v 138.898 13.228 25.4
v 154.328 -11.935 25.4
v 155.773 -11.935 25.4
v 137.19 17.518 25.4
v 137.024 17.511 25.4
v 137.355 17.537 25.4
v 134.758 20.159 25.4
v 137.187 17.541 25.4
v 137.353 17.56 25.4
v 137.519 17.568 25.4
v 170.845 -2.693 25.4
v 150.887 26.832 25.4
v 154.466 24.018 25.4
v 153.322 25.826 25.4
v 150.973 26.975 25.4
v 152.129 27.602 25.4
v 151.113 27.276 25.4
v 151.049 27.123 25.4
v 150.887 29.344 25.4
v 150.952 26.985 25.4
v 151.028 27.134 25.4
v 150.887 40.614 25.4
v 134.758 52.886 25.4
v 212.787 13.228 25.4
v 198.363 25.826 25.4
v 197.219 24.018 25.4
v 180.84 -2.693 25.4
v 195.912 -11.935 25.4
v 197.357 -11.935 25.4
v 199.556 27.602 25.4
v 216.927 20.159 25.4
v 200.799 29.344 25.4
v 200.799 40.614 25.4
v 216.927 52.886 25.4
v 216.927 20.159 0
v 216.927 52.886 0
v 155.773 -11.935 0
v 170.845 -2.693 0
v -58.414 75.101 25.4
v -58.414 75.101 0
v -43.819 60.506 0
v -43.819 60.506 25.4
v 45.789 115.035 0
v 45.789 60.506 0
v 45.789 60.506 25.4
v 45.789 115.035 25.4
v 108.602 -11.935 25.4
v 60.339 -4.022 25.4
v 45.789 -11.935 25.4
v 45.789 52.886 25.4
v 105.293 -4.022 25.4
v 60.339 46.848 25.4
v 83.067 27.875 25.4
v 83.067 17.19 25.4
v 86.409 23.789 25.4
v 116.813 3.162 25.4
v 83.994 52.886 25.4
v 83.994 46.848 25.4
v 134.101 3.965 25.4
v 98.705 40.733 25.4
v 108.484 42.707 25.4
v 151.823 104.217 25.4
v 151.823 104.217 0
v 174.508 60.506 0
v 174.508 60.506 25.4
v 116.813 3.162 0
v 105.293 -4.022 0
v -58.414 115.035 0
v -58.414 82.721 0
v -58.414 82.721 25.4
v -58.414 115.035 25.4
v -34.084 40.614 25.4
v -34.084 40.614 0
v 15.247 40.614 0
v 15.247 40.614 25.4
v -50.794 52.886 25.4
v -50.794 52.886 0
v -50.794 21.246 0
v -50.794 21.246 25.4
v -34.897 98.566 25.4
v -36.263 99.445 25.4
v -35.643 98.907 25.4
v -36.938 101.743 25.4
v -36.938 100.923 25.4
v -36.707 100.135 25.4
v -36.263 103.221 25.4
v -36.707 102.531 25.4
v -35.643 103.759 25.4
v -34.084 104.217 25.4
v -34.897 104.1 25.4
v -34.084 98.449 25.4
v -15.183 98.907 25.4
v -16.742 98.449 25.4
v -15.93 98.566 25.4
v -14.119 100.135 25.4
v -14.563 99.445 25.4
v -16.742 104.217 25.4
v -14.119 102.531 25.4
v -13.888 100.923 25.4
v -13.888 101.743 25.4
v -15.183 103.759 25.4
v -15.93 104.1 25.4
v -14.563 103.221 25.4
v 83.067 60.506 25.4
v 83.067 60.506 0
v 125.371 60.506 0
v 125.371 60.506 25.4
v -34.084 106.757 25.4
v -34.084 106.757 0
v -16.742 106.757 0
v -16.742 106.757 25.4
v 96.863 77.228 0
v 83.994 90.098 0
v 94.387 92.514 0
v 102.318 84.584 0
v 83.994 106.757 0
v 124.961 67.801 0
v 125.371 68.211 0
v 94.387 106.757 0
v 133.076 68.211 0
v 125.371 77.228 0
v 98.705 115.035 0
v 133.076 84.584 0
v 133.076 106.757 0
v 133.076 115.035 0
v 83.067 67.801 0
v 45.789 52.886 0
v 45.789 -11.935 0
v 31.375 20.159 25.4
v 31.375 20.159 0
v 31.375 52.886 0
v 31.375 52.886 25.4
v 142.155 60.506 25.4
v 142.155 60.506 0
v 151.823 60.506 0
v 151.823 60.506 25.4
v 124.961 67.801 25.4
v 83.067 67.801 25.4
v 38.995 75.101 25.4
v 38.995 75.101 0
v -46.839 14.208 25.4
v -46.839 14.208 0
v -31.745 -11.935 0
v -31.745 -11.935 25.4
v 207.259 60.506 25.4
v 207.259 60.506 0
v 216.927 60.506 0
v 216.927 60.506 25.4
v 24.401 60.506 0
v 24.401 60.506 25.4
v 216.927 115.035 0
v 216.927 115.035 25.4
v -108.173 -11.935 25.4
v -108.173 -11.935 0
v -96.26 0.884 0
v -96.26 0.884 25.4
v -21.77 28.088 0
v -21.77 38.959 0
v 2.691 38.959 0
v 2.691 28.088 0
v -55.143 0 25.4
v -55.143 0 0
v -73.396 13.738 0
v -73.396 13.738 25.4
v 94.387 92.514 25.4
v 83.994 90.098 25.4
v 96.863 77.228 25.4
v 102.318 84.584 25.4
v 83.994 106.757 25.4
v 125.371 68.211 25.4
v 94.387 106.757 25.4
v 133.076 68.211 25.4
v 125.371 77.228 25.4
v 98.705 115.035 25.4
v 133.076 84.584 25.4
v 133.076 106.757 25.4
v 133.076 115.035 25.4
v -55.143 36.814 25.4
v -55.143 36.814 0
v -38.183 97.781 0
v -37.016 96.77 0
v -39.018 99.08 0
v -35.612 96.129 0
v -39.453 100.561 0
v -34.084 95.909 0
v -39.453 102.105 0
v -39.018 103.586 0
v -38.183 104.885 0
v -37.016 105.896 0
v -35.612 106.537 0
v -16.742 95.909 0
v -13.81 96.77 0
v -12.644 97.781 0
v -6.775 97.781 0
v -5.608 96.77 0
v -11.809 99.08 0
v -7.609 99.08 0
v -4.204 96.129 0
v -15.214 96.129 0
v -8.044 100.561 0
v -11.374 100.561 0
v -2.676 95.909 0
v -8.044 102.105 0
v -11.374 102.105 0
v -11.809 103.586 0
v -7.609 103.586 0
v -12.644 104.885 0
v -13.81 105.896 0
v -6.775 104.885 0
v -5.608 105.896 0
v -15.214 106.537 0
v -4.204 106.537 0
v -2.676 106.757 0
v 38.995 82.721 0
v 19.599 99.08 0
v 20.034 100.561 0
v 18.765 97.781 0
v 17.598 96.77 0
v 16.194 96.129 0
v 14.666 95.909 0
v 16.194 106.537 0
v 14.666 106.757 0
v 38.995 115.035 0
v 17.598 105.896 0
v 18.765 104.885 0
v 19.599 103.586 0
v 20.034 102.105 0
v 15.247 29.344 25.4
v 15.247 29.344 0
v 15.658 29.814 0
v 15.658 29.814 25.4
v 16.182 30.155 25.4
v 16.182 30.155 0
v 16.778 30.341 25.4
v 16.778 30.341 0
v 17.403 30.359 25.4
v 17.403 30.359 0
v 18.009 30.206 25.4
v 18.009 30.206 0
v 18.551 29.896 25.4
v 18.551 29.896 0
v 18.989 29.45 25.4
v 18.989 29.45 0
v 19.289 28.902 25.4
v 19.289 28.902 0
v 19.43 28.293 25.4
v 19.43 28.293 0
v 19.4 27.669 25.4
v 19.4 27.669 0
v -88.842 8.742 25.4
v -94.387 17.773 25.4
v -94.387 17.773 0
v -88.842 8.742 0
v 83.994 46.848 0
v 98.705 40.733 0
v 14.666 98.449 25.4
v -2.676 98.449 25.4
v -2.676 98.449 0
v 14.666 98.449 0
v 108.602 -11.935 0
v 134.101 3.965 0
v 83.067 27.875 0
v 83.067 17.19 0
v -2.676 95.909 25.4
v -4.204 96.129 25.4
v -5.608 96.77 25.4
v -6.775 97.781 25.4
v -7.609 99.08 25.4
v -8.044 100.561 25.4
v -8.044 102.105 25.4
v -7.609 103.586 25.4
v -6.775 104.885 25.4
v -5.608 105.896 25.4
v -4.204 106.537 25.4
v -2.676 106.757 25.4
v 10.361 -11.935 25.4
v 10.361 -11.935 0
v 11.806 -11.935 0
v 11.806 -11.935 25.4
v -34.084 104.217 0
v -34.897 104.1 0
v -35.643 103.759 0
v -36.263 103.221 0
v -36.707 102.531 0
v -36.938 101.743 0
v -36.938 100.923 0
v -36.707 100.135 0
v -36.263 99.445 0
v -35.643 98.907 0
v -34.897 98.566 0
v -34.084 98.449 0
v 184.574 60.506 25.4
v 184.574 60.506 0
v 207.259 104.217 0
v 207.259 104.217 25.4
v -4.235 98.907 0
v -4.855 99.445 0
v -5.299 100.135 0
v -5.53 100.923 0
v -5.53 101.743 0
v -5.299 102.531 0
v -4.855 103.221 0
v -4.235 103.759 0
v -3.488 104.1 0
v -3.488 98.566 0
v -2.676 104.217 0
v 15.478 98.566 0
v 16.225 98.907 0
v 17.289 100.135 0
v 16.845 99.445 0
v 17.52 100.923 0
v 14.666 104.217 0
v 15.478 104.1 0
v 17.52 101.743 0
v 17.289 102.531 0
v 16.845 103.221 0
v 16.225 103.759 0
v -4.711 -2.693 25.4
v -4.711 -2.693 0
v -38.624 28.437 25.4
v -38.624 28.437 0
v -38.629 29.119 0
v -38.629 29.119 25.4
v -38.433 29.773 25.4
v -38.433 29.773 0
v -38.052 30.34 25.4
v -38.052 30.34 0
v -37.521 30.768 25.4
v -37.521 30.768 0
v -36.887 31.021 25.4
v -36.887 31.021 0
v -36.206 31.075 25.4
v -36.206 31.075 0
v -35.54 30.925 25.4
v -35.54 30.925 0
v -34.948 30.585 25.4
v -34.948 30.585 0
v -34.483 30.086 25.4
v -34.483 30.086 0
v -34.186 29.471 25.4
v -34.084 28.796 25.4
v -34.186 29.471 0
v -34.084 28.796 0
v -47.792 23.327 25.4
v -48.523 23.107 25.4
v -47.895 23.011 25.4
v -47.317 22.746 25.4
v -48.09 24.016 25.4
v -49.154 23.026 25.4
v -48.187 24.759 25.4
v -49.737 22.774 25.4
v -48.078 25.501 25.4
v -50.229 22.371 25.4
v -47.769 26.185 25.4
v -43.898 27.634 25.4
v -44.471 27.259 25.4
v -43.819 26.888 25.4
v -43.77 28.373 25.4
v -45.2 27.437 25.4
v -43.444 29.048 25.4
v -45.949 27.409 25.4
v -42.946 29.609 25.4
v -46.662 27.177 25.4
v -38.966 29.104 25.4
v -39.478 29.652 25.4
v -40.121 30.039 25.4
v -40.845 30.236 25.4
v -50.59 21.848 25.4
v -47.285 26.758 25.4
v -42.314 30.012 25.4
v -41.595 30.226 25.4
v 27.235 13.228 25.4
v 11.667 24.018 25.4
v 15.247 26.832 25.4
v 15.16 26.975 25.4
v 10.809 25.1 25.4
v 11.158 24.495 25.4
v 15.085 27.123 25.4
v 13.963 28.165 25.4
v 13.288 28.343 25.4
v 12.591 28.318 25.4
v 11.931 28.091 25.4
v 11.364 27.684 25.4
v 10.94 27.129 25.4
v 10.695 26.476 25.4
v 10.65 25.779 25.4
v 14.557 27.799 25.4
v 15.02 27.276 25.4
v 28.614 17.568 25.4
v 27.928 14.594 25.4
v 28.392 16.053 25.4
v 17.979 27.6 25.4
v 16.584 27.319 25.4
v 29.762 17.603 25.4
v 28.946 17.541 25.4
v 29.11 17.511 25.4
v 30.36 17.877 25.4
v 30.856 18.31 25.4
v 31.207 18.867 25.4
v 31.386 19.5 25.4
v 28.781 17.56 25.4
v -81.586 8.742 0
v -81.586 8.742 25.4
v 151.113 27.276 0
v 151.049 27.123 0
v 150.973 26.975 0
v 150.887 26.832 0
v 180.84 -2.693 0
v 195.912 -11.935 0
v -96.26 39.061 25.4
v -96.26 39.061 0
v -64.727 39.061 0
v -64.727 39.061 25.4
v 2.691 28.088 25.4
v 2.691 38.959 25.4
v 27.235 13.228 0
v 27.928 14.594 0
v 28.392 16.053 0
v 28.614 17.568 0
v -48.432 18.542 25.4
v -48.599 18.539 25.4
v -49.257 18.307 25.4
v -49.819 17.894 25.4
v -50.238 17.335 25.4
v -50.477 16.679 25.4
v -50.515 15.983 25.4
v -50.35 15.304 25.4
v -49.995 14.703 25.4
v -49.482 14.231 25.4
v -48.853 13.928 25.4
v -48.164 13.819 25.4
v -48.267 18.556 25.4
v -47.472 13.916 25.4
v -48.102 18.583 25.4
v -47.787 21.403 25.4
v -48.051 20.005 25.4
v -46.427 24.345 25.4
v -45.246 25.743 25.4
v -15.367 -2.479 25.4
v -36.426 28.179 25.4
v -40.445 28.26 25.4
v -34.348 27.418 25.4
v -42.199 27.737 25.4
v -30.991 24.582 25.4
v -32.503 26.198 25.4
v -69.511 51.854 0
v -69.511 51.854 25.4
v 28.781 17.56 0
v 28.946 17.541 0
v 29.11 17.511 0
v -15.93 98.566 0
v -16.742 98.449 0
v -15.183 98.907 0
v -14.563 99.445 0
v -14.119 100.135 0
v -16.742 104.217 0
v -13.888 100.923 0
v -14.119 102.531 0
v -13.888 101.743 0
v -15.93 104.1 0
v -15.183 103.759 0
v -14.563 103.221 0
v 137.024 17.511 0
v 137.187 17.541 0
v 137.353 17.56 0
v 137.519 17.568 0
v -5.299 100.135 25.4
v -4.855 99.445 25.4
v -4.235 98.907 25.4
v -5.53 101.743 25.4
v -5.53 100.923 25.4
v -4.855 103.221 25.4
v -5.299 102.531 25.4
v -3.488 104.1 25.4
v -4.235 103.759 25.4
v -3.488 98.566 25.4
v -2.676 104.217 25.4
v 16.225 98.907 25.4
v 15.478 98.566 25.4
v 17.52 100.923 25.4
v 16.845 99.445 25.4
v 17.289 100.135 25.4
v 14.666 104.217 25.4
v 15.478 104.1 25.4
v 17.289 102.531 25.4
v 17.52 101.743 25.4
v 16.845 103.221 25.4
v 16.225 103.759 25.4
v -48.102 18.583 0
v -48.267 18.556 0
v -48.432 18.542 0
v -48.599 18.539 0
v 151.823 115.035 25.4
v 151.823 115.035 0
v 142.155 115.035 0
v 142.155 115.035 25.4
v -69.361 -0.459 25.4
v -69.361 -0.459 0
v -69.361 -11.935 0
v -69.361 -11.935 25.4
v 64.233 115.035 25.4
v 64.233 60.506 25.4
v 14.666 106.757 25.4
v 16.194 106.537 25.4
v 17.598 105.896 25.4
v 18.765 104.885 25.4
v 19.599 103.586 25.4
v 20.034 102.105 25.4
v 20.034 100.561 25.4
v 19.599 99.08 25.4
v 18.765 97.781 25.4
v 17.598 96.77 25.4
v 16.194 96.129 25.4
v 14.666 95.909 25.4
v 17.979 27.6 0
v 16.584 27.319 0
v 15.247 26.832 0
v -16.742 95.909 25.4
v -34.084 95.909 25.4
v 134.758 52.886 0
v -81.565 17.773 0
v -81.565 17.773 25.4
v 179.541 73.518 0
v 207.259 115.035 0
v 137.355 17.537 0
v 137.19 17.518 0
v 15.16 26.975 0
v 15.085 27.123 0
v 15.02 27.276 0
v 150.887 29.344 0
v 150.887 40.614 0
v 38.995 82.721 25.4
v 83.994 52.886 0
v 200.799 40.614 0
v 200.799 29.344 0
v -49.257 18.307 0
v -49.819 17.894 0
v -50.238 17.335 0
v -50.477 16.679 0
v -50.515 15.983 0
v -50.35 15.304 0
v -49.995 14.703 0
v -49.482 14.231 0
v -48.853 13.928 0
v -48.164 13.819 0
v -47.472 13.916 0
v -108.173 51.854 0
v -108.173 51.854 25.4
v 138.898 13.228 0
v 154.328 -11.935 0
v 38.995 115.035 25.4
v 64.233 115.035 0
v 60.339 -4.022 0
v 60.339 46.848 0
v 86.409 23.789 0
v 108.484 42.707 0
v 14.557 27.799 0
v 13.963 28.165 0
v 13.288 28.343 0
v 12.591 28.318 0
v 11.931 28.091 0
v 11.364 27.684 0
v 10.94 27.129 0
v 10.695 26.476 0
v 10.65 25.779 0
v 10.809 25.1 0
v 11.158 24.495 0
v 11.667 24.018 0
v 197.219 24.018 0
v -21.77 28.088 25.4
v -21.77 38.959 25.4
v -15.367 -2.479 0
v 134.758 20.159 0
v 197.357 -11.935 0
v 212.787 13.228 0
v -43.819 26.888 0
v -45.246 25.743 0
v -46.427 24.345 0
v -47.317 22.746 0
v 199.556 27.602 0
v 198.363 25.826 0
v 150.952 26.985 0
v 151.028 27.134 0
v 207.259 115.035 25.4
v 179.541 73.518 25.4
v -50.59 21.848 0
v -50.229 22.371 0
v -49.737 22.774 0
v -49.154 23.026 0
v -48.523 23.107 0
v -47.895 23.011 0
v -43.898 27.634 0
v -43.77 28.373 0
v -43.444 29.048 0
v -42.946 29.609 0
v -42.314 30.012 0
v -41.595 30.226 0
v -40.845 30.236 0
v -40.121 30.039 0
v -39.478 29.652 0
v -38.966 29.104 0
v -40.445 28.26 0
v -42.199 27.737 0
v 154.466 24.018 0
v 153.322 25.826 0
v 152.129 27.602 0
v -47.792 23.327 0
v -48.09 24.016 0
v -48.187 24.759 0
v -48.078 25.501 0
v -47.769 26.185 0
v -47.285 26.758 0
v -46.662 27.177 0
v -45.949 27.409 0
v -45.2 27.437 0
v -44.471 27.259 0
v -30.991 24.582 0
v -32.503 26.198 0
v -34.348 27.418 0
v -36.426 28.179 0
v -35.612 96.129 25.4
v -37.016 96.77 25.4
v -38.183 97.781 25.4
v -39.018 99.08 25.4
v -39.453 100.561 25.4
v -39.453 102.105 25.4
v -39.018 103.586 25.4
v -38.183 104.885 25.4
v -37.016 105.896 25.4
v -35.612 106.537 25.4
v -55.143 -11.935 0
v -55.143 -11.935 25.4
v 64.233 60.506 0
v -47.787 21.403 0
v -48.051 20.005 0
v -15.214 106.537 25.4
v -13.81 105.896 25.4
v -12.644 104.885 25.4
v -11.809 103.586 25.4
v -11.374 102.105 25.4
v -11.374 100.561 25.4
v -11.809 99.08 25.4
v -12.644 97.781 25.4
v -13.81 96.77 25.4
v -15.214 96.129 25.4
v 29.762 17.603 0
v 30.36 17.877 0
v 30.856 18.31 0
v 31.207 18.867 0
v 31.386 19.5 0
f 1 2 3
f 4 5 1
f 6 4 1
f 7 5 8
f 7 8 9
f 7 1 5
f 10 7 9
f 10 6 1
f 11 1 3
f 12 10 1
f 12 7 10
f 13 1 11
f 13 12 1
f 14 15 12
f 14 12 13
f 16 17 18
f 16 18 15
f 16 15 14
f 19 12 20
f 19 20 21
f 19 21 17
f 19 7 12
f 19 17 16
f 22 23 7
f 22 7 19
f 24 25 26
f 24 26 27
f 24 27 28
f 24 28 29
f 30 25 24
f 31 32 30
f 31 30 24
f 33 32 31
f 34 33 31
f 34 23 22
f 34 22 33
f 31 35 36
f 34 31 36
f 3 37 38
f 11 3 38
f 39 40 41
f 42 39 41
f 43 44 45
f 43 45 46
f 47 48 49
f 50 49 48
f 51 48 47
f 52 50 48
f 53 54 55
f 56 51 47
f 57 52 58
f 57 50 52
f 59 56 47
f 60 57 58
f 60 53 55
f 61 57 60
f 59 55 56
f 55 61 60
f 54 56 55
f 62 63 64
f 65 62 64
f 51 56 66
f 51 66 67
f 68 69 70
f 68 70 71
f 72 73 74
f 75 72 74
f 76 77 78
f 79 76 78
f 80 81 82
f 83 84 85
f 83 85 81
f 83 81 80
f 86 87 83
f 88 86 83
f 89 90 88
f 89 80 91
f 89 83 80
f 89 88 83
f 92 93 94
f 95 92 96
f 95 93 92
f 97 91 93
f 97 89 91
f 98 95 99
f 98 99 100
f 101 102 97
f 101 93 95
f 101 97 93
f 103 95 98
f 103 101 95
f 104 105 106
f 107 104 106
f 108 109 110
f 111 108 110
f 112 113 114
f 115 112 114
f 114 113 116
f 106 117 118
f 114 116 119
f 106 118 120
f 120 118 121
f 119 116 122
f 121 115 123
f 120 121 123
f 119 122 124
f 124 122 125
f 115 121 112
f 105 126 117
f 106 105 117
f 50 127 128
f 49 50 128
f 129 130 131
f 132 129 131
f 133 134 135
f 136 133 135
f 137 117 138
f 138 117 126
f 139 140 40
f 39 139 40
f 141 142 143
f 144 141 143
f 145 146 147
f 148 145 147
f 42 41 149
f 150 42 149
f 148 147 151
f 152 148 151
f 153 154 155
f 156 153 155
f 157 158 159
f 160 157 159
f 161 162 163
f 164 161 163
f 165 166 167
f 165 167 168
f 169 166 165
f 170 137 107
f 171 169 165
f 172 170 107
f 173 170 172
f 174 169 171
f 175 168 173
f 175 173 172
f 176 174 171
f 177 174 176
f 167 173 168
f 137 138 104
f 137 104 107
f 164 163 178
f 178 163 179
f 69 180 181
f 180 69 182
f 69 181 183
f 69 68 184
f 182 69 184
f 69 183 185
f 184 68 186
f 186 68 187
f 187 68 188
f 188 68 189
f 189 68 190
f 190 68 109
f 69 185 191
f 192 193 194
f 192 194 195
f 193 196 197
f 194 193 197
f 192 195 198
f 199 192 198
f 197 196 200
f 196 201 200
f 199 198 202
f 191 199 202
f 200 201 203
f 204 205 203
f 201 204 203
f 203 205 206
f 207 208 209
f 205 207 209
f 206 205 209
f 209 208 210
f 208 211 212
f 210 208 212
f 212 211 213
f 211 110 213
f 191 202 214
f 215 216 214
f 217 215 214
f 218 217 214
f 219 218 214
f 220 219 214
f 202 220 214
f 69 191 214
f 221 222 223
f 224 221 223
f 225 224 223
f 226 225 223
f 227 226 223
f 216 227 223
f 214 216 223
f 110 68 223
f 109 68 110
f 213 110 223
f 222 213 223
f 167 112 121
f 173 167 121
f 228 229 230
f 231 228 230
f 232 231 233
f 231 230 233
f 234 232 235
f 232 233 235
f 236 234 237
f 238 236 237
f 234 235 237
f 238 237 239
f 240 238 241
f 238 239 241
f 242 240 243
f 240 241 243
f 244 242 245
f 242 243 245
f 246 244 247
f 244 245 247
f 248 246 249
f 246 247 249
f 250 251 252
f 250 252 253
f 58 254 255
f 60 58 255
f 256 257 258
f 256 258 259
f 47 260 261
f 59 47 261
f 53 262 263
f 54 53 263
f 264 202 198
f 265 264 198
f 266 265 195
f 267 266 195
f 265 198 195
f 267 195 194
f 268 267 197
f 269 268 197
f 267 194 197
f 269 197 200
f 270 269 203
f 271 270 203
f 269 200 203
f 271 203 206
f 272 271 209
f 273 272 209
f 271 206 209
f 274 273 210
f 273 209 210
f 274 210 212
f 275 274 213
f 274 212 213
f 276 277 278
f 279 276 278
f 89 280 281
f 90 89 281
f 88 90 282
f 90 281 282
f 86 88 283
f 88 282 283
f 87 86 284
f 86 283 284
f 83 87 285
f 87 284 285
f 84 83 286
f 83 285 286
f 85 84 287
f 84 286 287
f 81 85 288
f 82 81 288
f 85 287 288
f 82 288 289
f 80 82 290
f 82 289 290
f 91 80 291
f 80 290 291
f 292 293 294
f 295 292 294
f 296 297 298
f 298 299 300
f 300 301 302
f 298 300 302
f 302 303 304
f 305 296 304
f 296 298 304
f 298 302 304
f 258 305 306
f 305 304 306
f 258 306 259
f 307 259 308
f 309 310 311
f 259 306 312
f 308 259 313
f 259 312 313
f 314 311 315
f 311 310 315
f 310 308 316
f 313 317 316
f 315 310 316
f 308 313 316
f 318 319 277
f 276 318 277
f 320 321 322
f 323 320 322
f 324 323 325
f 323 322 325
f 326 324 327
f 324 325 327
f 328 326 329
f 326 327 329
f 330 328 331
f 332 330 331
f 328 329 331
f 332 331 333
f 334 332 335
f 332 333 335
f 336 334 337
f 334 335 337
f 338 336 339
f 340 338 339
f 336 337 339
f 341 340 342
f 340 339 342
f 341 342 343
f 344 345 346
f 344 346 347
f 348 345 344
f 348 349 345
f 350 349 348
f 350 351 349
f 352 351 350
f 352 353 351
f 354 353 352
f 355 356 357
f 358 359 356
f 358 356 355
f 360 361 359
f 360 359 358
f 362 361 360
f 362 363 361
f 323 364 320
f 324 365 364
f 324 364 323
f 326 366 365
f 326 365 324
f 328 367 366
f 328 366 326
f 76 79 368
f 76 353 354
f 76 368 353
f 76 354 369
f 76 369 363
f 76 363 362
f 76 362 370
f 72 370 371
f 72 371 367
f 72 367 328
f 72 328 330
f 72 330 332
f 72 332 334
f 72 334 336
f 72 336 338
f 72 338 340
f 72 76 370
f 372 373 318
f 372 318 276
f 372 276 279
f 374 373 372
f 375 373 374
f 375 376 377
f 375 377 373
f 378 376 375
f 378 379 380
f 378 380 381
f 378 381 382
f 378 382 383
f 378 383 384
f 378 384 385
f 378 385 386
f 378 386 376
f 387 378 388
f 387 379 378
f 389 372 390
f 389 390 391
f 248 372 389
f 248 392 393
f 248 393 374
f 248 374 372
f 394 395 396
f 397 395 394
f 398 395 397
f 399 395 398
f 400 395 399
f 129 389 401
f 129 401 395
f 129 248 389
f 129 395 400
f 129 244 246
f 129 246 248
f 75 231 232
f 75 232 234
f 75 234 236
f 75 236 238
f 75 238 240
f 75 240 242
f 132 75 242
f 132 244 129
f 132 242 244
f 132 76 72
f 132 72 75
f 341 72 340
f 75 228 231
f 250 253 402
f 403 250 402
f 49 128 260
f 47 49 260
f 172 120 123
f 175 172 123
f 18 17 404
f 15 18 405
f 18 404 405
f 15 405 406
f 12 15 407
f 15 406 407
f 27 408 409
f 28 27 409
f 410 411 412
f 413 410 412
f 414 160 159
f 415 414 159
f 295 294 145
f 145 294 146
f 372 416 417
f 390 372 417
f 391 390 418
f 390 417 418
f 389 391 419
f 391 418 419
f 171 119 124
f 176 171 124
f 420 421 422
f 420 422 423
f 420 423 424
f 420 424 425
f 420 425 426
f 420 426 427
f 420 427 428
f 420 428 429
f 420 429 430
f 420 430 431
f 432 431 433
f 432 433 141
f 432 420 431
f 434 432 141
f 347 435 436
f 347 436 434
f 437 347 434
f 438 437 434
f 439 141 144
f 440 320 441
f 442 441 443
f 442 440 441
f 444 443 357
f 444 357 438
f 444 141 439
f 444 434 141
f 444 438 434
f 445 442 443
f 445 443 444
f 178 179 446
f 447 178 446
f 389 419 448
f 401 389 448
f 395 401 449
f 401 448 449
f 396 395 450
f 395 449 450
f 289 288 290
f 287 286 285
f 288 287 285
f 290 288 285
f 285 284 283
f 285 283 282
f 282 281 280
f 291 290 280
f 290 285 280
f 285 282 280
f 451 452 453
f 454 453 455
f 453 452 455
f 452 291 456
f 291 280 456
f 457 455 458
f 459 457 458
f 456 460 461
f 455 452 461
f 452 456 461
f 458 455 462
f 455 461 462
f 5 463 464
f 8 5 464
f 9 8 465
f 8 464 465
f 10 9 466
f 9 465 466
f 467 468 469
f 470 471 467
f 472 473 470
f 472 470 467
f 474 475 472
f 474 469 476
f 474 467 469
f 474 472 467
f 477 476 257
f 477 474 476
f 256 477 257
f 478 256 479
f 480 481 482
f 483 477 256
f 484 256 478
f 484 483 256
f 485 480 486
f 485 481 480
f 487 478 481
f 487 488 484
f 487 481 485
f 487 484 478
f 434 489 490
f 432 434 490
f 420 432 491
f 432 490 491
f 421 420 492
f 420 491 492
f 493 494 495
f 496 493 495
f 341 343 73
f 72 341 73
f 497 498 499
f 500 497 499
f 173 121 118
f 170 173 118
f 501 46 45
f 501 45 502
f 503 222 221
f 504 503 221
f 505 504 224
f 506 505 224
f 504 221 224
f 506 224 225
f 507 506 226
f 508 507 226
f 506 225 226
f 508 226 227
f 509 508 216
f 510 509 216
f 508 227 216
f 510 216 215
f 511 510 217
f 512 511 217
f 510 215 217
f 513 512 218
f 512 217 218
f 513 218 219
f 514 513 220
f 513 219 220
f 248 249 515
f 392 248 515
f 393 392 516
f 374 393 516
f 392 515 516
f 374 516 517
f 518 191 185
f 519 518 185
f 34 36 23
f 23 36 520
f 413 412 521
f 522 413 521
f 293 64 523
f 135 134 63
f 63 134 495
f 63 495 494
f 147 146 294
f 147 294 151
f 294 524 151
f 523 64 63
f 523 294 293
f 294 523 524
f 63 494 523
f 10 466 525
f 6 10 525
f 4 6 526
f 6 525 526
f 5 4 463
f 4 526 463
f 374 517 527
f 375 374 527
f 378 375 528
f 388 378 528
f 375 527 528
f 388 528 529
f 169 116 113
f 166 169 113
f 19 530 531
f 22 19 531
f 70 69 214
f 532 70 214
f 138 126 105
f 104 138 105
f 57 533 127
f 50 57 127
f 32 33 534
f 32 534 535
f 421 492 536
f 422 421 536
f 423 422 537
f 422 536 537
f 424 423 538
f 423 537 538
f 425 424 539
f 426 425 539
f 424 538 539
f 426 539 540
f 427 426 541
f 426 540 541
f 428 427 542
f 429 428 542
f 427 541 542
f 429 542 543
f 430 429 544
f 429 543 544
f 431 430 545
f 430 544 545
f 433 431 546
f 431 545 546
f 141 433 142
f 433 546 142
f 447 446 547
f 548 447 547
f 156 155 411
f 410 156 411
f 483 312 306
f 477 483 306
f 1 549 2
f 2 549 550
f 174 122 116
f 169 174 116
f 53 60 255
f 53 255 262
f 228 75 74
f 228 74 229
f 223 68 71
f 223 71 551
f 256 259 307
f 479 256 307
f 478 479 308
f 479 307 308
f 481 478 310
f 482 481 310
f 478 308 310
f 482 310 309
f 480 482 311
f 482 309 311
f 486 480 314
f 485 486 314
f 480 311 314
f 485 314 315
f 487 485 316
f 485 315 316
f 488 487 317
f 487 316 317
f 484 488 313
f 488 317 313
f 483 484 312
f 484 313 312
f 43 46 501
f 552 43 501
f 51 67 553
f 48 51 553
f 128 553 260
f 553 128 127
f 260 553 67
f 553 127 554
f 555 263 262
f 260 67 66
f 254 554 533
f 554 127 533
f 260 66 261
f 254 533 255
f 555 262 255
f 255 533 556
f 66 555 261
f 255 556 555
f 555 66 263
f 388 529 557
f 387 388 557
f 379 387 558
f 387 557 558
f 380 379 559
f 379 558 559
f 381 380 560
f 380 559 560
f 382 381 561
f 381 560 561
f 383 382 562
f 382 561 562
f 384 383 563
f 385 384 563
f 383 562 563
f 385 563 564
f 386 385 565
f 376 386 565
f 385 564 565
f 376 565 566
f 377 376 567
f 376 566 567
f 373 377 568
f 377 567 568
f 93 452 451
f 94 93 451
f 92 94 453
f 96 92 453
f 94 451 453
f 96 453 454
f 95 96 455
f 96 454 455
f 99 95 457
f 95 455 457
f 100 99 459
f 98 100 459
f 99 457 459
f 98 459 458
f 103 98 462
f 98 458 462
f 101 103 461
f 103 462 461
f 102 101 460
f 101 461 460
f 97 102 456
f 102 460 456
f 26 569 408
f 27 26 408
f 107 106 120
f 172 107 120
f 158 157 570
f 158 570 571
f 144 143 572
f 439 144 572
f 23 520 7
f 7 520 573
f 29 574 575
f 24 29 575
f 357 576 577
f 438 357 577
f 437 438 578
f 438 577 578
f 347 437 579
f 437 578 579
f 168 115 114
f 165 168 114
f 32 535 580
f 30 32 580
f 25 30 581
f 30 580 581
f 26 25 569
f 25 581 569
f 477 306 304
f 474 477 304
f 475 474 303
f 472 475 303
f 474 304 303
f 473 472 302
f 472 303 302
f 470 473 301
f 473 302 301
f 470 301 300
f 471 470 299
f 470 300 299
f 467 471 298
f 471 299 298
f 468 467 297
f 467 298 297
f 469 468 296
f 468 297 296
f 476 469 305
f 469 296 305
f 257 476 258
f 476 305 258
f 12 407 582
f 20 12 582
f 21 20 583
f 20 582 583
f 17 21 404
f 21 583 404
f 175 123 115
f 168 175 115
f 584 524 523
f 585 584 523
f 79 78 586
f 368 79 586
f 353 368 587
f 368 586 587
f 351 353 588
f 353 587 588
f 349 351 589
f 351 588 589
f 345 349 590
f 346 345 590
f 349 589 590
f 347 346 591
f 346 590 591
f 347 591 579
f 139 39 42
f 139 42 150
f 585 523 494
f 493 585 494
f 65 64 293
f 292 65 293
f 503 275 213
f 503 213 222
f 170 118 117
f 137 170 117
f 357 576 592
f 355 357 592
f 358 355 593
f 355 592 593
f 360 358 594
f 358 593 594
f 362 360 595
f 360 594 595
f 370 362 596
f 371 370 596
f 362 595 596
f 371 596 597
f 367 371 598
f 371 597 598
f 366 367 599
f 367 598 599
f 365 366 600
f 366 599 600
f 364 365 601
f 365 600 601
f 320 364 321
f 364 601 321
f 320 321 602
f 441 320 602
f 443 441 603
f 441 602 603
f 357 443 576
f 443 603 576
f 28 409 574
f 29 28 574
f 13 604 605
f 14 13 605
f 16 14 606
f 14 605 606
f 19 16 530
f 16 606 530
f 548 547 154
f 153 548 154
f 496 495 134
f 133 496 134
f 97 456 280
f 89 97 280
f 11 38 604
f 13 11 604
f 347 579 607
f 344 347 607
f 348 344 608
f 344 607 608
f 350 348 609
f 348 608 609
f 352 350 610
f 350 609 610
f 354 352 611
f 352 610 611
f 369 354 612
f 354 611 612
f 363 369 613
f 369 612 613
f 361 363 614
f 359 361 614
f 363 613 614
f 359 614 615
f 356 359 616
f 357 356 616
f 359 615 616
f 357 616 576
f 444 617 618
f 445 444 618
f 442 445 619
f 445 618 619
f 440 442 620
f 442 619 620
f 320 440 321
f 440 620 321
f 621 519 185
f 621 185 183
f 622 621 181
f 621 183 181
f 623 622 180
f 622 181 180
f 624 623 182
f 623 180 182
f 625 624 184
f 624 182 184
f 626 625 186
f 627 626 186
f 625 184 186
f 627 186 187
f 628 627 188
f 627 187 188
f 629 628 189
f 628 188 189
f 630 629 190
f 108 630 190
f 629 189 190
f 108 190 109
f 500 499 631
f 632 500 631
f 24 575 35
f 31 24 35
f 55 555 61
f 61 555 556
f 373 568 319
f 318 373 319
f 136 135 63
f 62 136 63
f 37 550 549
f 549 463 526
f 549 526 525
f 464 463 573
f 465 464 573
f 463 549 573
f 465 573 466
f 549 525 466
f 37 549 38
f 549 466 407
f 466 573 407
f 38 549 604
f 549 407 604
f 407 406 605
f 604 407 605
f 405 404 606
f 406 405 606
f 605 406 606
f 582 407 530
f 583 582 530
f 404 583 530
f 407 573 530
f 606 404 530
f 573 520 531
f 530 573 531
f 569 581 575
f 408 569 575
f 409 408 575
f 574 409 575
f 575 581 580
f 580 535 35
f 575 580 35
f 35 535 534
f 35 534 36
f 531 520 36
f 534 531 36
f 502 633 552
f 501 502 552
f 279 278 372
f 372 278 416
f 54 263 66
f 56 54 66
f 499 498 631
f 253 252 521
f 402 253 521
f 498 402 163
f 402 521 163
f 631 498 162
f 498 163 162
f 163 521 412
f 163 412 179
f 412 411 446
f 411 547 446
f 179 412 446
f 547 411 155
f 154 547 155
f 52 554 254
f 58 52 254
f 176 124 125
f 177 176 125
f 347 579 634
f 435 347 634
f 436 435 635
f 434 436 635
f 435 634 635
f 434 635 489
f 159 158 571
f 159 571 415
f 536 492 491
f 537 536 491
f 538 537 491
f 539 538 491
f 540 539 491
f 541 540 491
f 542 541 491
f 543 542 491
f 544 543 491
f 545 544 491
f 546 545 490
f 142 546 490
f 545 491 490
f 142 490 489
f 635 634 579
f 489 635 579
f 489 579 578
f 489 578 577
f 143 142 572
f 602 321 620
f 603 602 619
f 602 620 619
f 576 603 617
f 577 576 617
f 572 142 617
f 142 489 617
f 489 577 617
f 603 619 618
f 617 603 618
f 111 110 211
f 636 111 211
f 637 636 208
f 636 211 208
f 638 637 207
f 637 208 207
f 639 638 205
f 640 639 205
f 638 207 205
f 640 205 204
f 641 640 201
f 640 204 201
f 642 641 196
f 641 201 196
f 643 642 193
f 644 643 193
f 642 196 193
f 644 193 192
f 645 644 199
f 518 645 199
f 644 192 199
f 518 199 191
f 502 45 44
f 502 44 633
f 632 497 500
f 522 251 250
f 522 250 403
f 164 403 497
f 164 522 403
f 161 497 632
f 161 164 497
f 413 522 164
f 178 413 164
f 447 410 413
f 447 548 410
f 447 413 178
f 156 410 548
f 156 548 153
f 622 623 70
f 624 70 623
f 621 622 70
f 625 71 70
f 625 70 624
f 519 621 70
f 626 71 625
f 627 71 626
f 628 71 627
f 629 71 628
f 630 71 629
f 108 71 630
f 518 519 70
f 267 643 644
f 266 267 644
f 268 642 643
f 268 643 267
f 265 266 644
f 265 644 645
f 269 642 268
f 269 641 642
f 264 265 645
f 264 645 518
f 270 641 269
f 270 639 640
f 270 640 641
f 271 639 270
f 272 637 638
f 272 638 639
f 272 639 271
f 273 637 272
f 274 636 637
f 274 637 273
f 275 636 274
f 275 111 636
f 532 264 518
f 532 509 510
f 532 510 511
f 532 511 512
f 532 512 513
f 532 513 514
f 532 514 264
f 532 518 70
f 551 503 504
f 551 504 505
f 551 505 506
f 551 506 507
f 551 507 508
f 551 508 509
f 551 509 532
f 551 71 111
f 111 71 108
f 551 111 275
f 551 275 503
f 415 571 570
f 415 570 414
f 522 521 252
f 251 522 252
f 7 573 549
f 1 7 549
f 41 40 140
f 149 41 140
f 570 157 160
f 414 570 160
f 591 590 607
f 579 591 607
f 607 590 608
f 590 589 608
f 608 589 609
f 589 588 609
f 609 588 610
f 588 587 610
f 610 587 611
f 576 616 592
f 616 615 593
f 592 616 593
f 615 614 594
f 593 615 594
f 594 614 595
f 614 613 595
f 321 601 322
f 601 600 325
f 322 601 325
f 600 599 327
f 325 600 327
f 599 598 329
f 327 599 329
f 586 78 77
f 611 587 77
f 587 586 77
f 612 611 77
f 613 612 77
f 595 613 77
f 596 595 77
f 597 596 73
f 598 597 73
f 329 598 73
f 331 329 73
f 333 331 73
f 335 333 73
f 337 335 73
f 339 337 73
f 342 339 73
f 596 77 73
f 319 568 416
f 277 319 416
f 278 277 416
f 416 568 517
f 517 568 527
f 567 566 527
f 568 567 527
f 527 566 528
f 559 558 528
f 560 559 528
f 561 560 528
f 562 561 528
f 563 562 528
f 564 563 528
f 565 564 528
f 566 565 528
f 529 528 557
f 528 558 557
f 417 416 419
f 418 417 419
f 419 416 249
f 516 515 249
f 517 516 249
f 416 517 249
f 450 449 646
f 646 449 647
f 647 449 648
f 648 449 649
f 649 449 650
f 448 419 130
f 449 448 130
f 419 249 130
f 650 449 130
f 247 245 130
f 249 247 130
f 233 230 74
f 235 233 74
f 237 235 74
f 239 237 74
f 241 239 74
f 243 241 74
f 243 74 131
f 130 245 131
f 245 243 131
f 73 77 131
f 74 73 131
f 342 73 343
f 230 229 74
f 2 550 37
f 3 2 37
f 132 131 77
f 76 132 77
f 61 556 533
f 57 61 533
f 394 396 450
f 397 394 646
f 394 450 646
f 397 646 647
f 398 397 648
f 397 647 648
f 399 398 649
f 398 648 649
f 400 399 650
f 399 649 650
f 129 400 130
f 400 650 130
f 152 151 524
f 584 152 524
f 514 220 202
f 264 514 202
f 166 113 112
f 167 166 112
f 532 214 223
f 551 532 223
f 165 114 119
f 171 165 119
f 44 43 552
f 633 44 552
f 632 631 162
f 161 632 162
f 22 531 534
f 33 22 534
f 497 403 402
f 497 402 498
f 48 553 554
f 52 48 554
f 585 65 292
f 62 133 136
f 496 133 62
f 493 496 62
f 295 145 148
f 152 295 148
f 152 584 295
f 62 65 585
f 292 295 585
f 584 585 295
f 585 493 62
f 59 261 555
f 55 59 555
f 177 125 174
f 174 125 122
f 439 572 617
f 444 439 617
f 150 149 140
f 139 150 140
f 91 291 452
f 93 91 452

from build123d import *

# Parameters (mm, degrees)
BOSS_EXTRUDE2_DEPTH    = 25.4
BOSS_EXTRUDE2_2_DEPTH  = 25.4
BOSS_EXTRUDE2_3_DEPTH  = 25.4
SKETCH1_W              = 24.461502648
SKETCH1_H              = 10.87055051
BOSS_EXTRUDE2_4_DEPTH  = 25.4
BOSS_EXTRUDE2_5_DEPTH  = 25.4
BOSS_EXTRUDE2_6_DEPTH  = 25.4
BOSS_EXTRUDE2_7_DEPTH  = 25.4
SKETCH1_W_2            = 97.40937404
SKETCH1_H_2            = 32.313406886
BOSS_EXTRUDE2_8_DEPTH  = 25.4
BOSS_EXTRUDE2_9_DEPTH  = 25.4
BOSS_EXTRUDE2_10_DEPTH = 25.4
SKETCH1_W_3            = 18.443976291
SKETCH1_H_3            = 54.528233079
BOSS_EXTRUDE2_11_DEPTH = 25.4
BOSS_EXTRUDE2_12_DEPTH = 25.4
BOSS_EXTRUDE2_13_DEPTH = 25.4


with BuildPart() as part:
    # Sketch1 → Boss-Extrude2 (new body)
    with BuildSketch(Plane.XY):
        Polygon((-108.172530118, -11.93518958), (-96.26010229, 0.884070844), (-96.26010229, 39.060533562), (-64.726825967, 39.060533562), (-81.565077277, 17.772573776), (-94.386884579, 17.772573776), (-88.841643973, 8.742184939), (-81.585901967, 8.742184939), (-69.36107171, -0.45860836), (-69.36107171, -11.93518958), (-55.143012689, -11.93518958), (-55.143012689, 0), (-73.395926297, 13.737719189), (-55.143012689, 36.814182636), (-69.510757828, 51.854310106), (-108.172530118, 51.854310106), align=None)
    extrude(amount=BOSS_EXTRUDE2_DEPTH)


with BuildPart() as body_2:
    # Sketch1 → Boss-Extrude2 2 (new body)
    with BuildSketch(Plane.XY):
        with BuildLine():
            Line((-46.838728316, 14.208343836), (-31.744752261, -11.93518958))
            Line((-31.744752261, -11.93518958), (-15.366651823, -2.479288883))
            Line((-15.366651823, -2.479288883), (-30.990670753, 24.582305721))
            ThreePointArc((-30.990670753, 24.582305721), (-34.348326386, 27.418492639), (-38.623947508, 28.436761569))
            ThreePointArc((-38.623947508, 28.436761569), (-41.334535763, 28.041229116), (-43.819070994, 26.887617701))
            ThreePointArc((-43.819070994, 26.887617701), (-45.870352162, 25.072134244), (-47.317310012, 22.746183344))
            ThreePointArc((-47.317310012, 22.746183344), (-47.945269778, 20.708927541), (-48.102408011, 18.58288609))
            ThreePointArc((-48.102408011, 18.58288609), (-48.349430213, 18.547497946), (-48.598838642, 18.539268436))
            ThreePointArc((-48.598838642, 18.539268436), (-50.349964463, 15.304480473), (-46.838728316, 14.208343836))
        make_face()
    extrude(amount=BOSS_EXTRUDE2_2_DEPTH)


with BuildPart() as body_3:
    # Sketch1 → Boss-Extrude2 3 (new body)
    with BuildSketch(Plane.XY):
        with BuildLine():
            ThreePointArc((27.235458411, 13.228090155), (28.189211283, 15.313902664), (28.614455488, 17.567660798))
            ThreePointArc((28.614455488, 17.567660798), (28.863494696, 17.552274854), (29.109558058, 17.510921785))
            ThreePointArc((29.109558058, 17.510921785), (30.855913684, 18.309898726), (31.375476852, 20.158729772))
            Line((31.375476852, 20.158729772), (31.375476852, 52.886273929))
            Line((31.375476852, 52.886273929), (-50.793897188, 52.886273929))
            Line((-50.793897188, 52.886273929), (-50.793897188, 21.246110341))
            ThreePointArc((-50.793897188, 21.246110341), (-49.454250903, 22.920056612), (-47.317310012, 22.746183344))
            ThreePointArc((-47.317310012, 22.746183344), (-47.546826095, 26.488239395), (-43.819070994, 26.887617701))
            ThreePointArc((-43.819070994, 26.887617701), (-41.96163717, 30.144241829), (-38.623947508, 28.436761569))
            ThreePointArc((-38.623947508, 28.436761569), (-36.548711873, 31.073377711), (-34.08421851, 28.796401627))
            Line((-34.08421851, 28.796401627), (-34.08421851, 40.613707206))
            Line((-34.08421851, 40.613707206), (15.246800093, 40.613707206))
            Line((15.246800093, 40.613707206), (15.246800093, 29.343839534))
            ThreePointArc((15.246800093, 29.343839534), (18.009041678, 30.206446948), (19.400069174, 27.668906281))
            ThreePointArc((19.400069174, 27.668906281), (17.276133744, 27.485486089), (15.246800093, 26.832378436))
            ThreePointArc((15.246800093, 26.832378436), (15.121200281, 27.048010012), (15.019873113, 27.276056266))
            ThreePointArc((15.019873113, 27.276056266), (11.364167353, 27.683622468), (11.66746819, 24.017793311))
            Line((11.66746819, 24.017793311), (-4.711436484, -2.693039791))
            Line((-4.711436484, -2.693039791), (10.360726486, -11.93518958))
            Line((10.360726486, -11.93518958), (11.805503139, -11.93518958))
            Line((11.805503139, -11.93518958), (27.235458411, 13.228090155))
        make_face()
    extrude(amount=BOSS_EXTRUDE2_3_DEPTH)


with BuildPart() as body_4:
    # Sketch1 → Boss-Extrude2 4 (new body)
    with BuildSketch(Plane.XY):
        with Locations((-9.539545162, 33.52338424)):
            Rectangle(SKETCH1_W, SKETCH1_H)
    extrude(amount=BOSS_EXTRUDE2_4_DEPTH)


with BuildPart() as body_5:
    # Sketch1 → Boss-Extrude2 5 (new body)
    with BuildSketch(Plane.XY):
        Polygon((45.788811717, 52.886273929), (45.788811717, -11.93518958), (108.601620736, -11.93518958), (134.101452531, 3.965297599), (86.409473786, 23.78948382), (108.484058542, 42.706539224), (83.994191176, 52.886273929), align=None)
        Polygon((60.33922231, 46.847651943), (83.994191176, 46.847651943), (98.705457979, 40.732600726), (83.066671585, 27.87507369), (83.066671585, 17.189671733), (116.813298843, 3.162167722), (105.292592369, -4.021599098), (60.33922231, -4.021599098), align=None, mode=Mode.SUBTRACT)
    extrude(amount=BOSS_EXTRUDE2_5_DEPTH)


with BuildPart() as body_6:
    # Sketch1 → Boss-Extrude2 6 (new body)
    with BuildSketch(Plane.XY):
        with BuildLine():
            Line((134.757866317, 20.158729772), (138.897884758, 13.228090155))
            Line((138.897884758, 13.228090155), (154.327840031, -11.93518958))
            Line((154.327840031, -11.93518958), (155.772616684, -11.93518958))
            Line((155.772616684, -11.93518958), (170.844779653, -2.693039791))
            Line((170.844779653, -2.693039791), (154.46587498, 24.017793311))
            ThreePointArc((154.46587498, 24.017793311), (152.731676351, 26.718092847), (150.886543077, 29.343839534))
            Line((150.886543077, 29.343839534), (150.886543077, 40.613707206))
            Line((150.886543077, 40.613707206), (200.798563598, 40.613707206))
            Line((200.798563598, 40.613707206), (200.798563598, 29.343839534))
            ThreePointArc((200.798563598, 29.343839534), (198.953430323, 26.718092847), (197.219231694, 24.017793311))
            Line((197.219231694, 24.017793311), (180.840327021, -2.693039791))
            Line((180.840327021, -2.693039791), (195.91248999, -11.93518958))
            Line((195.91248999, -11.93518958), (197.357266644, -11.93518958))
            Line((197.357266644, -11.93518958), (212.787221916, 13.228090155))
            Line((212.787221916, 13.228090155), (216.927240357, 20.158729772))
            Line((216.927240357, 20.158729772), (216.927240357, 52.886273929))
            Line((216.927240357, 52.886273929), (134.757866317, 52.886273929))
            Line((134.757866317, 52.886273929), (134.757866317, 20.158729772))
        make_face()
        with BuildLine():
            ThreePointArc((137.518887681, 17.567660798), (137.27288843, 17.525748302), (137.023785111, 17.510921785))
            ThreePointArc((137.023785111, 17.510921785), (137.269848473, 17.552274854), (137.518887681, 17.567660798))
        make_face(mode=Mode.SUBTRACT)
        with BuildLine():
            ThreePointArc((151.113470057, 27.276056266), (151.012142888, 27.048010012), (150.886543077, 26.832378436))
            ThreePointArc((150.886543077, 26.832378436), (150.988371565, 27.060168281), (151.113470057, 27.276056266))
        make_face(mode=Mode.SUBTRACT)
    extrude(amount=BOSS_EXTRUDE2_6_DEPTH)


with BuildPart() as body_7:
    # Sketch1 → Boss-Extrude2 7 (new body)
    with BuildSketch(Plane.XY):
        Polygon((-58.413897188, 75.101100122), (-43.819070994, 60.506273929), (24.400650659, 60.506273929), (38.995476852, 75.101100122), align=None)
    extrude(amount=BOSS_EXTRUDE2_7_DEPTH)


with BuildPart() as body_8:
    # Sketch1 → Boss-Extrude2 8 (new body)
    with BuildSketch(Plane.XY):
        with Locations((-9.709210168, 98.877803565)):
            Rectangle(SKETCH1_W_2, SKETCH1_H_2)
        with BuildLine():
            ThreePointArc((-34.08421851, 95.909460513), (-39.507739158, 101.332981161), (-34.08421851, 106.756501809))
            Line((-34.08421851, 106.756501809), (-16.742394345, 106.756501809))
            ThreePointArc((-16.742394345, 106.756501809), (-11.318873697, 101.332981161), (-16.742394345, 95.909460513))
            Line((-16.742394345, 95.909460513), (-34.08421851, 95.909460513))
        make_face(mode=Mode.SUBTRACT)
        with BuildLine():
            ThreePointArc((14.665798175, 106.756501809), (20.089318823, 101.332981161), (14.665798175, 95.909460513))
            Line((14.665798175, 95.909460513), (-2.67602599, 95.909460513))
            ThreePointArc((-2.67602599, 95.909460513), (-8.099546638, 101.332981161), (-2.67602599, 106.756501809))
            Line((-2.67602599, 106.756501809), (14.665798175, 106.756501809))
        make_face(mode=Mode.SUBTRACT)
    extrude(amount=BOSS_EXTRUDE2_8_DEPTH)


with BuildPart() as body_9:
    # Sketch1 → Boss-Extrude2 9 (new body)
    with BuildSketch(Plane.XY):
        with BuildLine():
            Line((-16.742394345, 104.216501809), (-34.08421851, 104.216501809))
            ThreePointArc((-34.08421851, 104.216501809), (-36.967739158, 101.332981161), (-34.08421851, 98.449460513))
            Line((-34.08421851, 98.449460513), (-16.742394345, 98.449460513))
            ThreePointArc((-16.742394345, 98.449460513), (-13.858873697, 101.332981161), (-16.742394345, 104.216501809))
        make_face()
    extrude(amount=BOSS_EXTRUDE2_9_DEPTH)


with BuildPart() as body_10:
    # Sketch1 → Boss-Extrude2 10 (new body)
    with BuildSketch(Plane.XY):
        with BuildLine():
            ThreePointArc((14.665798175, 98.449460513), (17.549318823, 101.332981161), (14.665798175, 104.216501809))
            Line((14.665798175, 104.216501809), (-2.67602599, 104.216501809))
            ThreePointArc((-2.67602599, 104.216501809), (-5.559546638, 101.332981161), (-2.67602599, 98.449460513))
            Line((-2.67602599, 98.449460513), (14.665798175, 98.449460513))
        make_face()
    extrude(amount=BOSS_EXTRUDE2_10_DEPTH)


with BuildPart() as body_11:
    # Sketch1 → Boss-Extrude2 11 (new body)
    with BuildSketch(Plane.XY):
        with Locations((55.010799863, 87.770390469)):
            Rectangle(SKETCH1_W_3, SKETCH1_H_3)
    extrude(amount=BOSS_EXTRUDE2_11_DEPTH)


with BuildPart() as body_12:
    # Sketch1 → Boss-Extrude2 12 (new body)
    with BuildSketch(Plane.XY):
        Polygon((83.066671585, 67.800770925), (83.066671585, 60.506273929), (125.371409153, 60.506273929), (133.076133815, 68.210998592), (133.076133815, 84.583967788), (102.317567308, 84.583967788), (94.387045713, 92.514489383), (94.387045713, 106.756501809), (133.076133815, 106.756501809), (133.076133815, 115.034507008), (98.705457979, 115.034507008), (83.994191176, 106.756501809), (83.994191176, 90.097550177), (96.863406967, 77.228334386), (125.371409153, 77.228334386), (125.371409153, 68.210998592), (124.961181486, 67.800770925), align=None)
    extrude(amount=BOSS_EXTRUDE2_12_DEPTH)


with BuildPart() as body_13:
    # Sketch1 → Boss-Extrude2 13 (new body)
    with BuildSketch(Plane.XY):
        Polygon((142.154606016, 115.034507008), (142.154606016, 60.506273929), (151.823190987, 60.506273929), (151.823190987, 104.216501809), (174.508171362, 60.506273929), (184.573675011, 60.506273929), (207.258655386, 104.216501809), (207.258655386, 60.506273929), (216.927240357, 60.506273929), (216.927240357, 115.034507008), (207.258655386, 115.034507008), (179.540923187, 73.518123702), (151.823190987, 115.034507008), align=None)
    extrude(amount=BOSS_EXTRUDE2_13_DEPTH)


solid = Compound([part.part, body_2.part, body_3.part, body_4.part, body_5.part, body_6.part, body_7.part, body_8.part, body_9.part, body_10.part, body_11.part, body_12.part, body_13.part])
